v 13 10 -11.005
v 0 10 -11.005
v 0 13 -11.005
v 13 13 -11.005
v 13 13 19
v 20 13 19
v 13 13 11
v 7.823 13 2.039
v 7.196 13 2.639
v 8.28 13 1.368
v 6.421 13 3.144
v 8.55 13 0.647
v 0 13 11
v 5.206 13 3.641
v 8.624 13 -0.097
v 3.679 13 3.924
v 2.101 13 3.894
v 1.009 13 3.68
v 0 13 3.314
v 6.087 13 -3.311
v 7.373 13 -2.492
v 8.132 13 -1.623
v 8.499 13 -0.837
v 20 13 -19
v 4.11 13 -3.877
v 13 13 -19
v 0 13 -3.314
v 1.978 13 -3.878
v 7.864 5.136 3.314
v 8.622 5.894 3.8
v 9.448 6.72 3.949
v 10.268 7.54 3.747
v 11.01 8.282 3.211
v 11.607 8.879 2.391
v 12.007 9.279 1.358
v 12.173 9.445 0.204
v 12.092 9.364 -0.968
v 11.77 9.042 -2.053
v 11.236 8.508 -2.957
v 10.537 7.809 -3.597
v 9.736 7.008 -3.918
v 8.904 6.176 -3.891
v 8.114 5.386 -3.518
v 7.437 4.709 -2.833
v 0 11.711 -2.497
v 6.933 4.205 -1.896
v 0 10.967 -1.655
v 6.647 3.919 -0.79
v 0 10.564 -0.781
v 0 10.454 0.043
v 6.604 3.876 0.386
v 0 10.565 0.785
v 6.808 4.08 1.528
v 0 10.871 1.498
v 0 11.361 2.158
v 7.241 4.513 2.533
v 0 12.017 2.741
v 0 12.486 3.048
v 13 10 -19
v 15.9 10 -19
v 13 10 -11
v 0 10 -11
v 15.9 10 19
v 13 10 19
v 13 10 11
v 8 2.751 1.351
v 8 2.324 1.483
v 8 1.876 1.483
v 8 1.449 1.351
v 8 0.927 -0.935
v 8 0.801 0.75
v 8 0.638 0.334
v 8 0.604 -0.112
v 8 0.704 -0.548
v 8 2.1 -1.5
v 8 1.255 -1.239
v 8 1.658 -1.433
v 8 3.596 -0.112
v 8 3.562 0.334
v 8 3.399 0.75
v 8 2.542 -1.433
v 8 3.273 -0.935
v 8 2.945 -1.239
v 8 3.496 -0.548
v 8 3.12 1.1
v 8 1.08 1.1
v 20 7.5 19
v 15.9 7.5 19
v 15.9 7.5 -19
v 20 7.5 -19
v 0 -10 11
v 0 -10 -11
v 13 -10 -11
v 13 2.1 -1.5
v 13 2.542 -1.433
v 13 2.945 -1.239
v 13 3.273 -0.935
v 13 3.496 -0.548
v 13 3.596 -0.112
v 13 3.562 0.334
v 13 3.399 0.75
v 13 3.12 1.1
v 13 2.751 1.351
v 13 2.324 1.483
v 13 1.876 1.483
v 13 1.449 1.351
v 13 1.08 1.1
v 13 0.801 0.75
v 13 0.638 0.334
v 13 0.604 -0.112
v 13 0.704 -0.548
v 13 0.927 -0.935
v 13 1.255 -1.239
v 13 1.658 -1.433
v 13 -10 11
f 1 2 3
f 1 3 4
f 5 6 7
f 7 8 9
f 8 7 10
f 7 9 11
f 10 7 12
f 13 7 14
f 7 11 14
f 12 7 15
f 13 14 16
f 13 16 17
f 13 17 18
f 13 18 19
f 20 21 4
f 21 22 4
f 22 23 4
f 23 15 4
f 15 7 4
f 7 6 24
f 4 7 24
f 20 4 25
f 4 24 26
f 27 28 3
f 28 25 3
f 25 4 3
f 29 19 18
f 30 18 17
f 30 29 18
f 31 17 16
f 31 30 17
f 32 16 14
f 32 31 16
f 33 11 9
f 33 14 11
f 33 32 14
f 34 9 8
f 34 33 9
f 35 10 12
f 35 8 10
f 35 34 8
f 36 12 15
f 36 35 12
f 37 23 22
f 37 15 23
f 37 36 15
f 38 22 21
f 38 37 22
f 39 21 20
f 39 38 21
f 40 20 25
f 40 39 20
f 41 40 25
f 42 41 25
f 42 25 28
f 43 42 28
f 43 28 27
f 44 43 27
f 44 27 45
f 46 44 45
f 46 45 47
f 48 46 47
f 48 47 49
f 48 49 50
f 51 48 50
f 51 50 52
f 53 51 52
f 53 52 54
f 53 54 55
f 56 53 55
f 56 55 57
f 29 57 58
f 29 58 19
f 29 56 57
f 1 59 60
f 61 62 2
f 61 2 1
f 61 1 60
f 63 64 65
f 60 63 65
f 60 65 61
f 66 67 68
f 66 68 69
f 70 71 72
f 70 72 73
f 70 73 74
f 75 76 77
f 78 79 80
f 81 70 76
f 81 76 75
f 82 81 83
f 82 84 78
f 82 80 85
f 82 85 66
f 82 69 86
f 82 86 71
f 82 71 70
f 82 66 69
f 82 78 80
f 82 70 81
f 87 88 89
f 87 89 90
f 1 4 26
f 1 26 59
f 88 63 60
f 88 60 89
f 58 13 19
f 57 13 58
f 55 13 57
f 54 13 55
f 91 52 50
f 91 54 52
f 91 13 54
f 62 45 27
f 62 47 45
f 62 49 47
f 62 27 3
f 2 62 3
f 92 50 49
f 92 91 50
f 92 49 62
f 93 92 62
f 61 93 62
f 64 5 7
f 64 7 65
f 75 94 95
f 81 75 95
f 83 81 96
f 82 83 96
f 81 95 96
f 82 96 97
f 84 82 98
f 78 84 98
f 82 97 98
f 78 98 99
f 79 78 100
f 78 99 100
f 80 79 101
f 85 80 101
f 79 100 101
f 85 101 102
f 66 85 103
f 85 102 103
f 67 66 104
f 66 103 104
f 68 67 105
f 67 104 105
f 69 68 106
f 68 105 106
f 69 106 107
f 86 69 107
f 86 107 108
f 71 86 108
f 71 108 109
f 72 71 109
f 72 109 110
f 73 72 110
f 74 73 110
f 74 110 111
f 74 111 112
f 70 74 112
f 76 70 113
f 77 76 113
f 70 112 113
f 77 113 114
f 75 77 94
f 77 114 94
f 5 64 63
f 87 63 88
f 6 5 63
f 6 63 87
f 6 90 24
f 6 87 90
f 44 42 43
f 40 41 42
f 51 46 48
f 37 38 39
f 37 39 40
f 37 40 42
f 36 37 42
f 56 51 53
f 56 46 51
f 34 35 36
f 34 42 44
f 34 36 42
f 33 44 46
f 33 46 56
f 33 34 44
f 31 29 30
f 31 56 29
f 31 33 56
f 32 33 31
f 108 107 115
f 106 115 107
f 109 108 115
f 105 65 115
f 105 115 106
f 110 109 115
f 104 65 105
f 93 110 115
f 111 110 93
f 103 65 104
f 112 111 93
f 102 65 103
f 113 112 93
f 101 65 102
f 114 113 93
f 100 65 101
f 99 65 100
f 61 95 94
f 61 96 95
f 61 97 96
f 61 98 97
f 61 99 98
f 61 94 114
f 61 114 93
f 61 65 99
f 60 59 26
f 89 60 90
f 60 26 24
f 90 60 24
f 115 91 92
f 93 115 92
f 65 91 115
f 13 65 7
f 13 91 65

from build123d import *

# Parameters (mm, degrees)
SKETCH_1_W               = 22
SKETCH_1_H               = 20
EXTRUDE_1_DEPTH          = 13
SKETCH_2_W               = 15.9
SKETCH_2_H               = 22.004551976
EXTRUDE_2_DEPTH          = 3
SKETCH_3_W               = 22
SKETCH_3_H               = 5.5
EXTRUDE_3_DEPTH          = 4.1
EXTRUDE_4_DEPTH          = 8
EXTRUDE_5_DEPTH          = 8
SKETCH_7_R               = 1.5
CUT_EXTRUDE_1_DEPTH      = 5
CUT_EXTRUDE_2_DEPTH      = 35.799425283
CUT_EXTRUDE_2_DEPTH_BACK = 9
SKETCH_9_R               = 3.95


with BuildPart() as part:
    # 草图1 → 凸台-拉伸1 (new body)
    with BuildSketch(Plane(origin=(0, 0, 0), x_dir=(0, 0, -1), z_dir=(1, 0, 0))):
        Rectangle(SKETCH_1_W, SKETCH_1_H)
    extrude(amount=EXTRUDE_1_DEPTH)

    # 草图2 → 凸台-拉伸2 (add)
    with BuildSketch(Plane(origin=(0, 10, 0), x_dir=(1, 0, 0), z_dir=(0, 1, 0))):
        with Locations((7.95, 0.002275988)):
            Rectangle(SKETCH_2_W, SKETCH_2_H)
    extrude(amount=EXTRUDE_2_DEPTH)

    # 草图3 → 凸台-拉伸3 (add)
    with BuildSketch(Plane(origin=(15.9, 0, 0), x_dir=(0, 0, -1), z_dir=(1, 0, 0))):
        with Locations((0, 10.25)):
            Rectangle(SKETCH_3_W, SKETCH_3_H)
    extrude(amount=EXTRUDE_3_DEPTH)

    # 草图5 → 凸台-拉伸4 (add)
    with BuildSketch(Plane.XY.offset(11)):
        Polygon((13, 13), (13, 10), (15.9, 10), (15.9, 7.5), (20, 7.5), (20, 13), align=None)
    extrude(amount=EXTRUDE_4_DEPTH)

    # 草图6 → 凸台-拉伸5 (add)
    with BuildSketch(Plane(origin=(0, 0, -11), x_dir=(-1, 0, 0), z_dir=(0, 0, -1))):
        Polygon((-13, 13), (-13, 10), (-15.9, 10), (-15.9, 7.5), (-20, 7.5), (-20, 13), align=None)
    extrude(amount=EXTRUDE_5_DEPTH)

    # 草图7 → 切除-拉伸1 (cut)
    with BuildSketch(Plane(origin=(13, 0, 0), x_dir=(0, 0, -1), z_dir=(1, 0, 0))):
        with Locations((0, 2.1)):
            Circle(SKETCH_7_R)
    extrude(amount=-CUT_EXTRUDE_1_DEPTH, mode=Mode.SUBTRACT)

    # 草图9 → 切除-拉伸2 (cut, two sides: drawn at the far end of the back side and taken through both)
    with BuildSketch(Plane(origin=(-5, 5, 0), x_dir=(0, 0, -1), z_dir=(-0.7071067811865464, 0.7071067811865488, 0)).offset(-CUT_EXTRUDE_2_DEPTH_BACK)):
        with Locations(Location((0, -11.341614651, 0), (0, 0, 147.03627328))):
            Circle(SKETCH_9_R)
    extrude(amount=CUT_EXTRUDE_2_DEPTH + CUT_EXTRUDE_2_DEPTH_BACK, mode=Mode.SUBTRACT)


solid = part.part
